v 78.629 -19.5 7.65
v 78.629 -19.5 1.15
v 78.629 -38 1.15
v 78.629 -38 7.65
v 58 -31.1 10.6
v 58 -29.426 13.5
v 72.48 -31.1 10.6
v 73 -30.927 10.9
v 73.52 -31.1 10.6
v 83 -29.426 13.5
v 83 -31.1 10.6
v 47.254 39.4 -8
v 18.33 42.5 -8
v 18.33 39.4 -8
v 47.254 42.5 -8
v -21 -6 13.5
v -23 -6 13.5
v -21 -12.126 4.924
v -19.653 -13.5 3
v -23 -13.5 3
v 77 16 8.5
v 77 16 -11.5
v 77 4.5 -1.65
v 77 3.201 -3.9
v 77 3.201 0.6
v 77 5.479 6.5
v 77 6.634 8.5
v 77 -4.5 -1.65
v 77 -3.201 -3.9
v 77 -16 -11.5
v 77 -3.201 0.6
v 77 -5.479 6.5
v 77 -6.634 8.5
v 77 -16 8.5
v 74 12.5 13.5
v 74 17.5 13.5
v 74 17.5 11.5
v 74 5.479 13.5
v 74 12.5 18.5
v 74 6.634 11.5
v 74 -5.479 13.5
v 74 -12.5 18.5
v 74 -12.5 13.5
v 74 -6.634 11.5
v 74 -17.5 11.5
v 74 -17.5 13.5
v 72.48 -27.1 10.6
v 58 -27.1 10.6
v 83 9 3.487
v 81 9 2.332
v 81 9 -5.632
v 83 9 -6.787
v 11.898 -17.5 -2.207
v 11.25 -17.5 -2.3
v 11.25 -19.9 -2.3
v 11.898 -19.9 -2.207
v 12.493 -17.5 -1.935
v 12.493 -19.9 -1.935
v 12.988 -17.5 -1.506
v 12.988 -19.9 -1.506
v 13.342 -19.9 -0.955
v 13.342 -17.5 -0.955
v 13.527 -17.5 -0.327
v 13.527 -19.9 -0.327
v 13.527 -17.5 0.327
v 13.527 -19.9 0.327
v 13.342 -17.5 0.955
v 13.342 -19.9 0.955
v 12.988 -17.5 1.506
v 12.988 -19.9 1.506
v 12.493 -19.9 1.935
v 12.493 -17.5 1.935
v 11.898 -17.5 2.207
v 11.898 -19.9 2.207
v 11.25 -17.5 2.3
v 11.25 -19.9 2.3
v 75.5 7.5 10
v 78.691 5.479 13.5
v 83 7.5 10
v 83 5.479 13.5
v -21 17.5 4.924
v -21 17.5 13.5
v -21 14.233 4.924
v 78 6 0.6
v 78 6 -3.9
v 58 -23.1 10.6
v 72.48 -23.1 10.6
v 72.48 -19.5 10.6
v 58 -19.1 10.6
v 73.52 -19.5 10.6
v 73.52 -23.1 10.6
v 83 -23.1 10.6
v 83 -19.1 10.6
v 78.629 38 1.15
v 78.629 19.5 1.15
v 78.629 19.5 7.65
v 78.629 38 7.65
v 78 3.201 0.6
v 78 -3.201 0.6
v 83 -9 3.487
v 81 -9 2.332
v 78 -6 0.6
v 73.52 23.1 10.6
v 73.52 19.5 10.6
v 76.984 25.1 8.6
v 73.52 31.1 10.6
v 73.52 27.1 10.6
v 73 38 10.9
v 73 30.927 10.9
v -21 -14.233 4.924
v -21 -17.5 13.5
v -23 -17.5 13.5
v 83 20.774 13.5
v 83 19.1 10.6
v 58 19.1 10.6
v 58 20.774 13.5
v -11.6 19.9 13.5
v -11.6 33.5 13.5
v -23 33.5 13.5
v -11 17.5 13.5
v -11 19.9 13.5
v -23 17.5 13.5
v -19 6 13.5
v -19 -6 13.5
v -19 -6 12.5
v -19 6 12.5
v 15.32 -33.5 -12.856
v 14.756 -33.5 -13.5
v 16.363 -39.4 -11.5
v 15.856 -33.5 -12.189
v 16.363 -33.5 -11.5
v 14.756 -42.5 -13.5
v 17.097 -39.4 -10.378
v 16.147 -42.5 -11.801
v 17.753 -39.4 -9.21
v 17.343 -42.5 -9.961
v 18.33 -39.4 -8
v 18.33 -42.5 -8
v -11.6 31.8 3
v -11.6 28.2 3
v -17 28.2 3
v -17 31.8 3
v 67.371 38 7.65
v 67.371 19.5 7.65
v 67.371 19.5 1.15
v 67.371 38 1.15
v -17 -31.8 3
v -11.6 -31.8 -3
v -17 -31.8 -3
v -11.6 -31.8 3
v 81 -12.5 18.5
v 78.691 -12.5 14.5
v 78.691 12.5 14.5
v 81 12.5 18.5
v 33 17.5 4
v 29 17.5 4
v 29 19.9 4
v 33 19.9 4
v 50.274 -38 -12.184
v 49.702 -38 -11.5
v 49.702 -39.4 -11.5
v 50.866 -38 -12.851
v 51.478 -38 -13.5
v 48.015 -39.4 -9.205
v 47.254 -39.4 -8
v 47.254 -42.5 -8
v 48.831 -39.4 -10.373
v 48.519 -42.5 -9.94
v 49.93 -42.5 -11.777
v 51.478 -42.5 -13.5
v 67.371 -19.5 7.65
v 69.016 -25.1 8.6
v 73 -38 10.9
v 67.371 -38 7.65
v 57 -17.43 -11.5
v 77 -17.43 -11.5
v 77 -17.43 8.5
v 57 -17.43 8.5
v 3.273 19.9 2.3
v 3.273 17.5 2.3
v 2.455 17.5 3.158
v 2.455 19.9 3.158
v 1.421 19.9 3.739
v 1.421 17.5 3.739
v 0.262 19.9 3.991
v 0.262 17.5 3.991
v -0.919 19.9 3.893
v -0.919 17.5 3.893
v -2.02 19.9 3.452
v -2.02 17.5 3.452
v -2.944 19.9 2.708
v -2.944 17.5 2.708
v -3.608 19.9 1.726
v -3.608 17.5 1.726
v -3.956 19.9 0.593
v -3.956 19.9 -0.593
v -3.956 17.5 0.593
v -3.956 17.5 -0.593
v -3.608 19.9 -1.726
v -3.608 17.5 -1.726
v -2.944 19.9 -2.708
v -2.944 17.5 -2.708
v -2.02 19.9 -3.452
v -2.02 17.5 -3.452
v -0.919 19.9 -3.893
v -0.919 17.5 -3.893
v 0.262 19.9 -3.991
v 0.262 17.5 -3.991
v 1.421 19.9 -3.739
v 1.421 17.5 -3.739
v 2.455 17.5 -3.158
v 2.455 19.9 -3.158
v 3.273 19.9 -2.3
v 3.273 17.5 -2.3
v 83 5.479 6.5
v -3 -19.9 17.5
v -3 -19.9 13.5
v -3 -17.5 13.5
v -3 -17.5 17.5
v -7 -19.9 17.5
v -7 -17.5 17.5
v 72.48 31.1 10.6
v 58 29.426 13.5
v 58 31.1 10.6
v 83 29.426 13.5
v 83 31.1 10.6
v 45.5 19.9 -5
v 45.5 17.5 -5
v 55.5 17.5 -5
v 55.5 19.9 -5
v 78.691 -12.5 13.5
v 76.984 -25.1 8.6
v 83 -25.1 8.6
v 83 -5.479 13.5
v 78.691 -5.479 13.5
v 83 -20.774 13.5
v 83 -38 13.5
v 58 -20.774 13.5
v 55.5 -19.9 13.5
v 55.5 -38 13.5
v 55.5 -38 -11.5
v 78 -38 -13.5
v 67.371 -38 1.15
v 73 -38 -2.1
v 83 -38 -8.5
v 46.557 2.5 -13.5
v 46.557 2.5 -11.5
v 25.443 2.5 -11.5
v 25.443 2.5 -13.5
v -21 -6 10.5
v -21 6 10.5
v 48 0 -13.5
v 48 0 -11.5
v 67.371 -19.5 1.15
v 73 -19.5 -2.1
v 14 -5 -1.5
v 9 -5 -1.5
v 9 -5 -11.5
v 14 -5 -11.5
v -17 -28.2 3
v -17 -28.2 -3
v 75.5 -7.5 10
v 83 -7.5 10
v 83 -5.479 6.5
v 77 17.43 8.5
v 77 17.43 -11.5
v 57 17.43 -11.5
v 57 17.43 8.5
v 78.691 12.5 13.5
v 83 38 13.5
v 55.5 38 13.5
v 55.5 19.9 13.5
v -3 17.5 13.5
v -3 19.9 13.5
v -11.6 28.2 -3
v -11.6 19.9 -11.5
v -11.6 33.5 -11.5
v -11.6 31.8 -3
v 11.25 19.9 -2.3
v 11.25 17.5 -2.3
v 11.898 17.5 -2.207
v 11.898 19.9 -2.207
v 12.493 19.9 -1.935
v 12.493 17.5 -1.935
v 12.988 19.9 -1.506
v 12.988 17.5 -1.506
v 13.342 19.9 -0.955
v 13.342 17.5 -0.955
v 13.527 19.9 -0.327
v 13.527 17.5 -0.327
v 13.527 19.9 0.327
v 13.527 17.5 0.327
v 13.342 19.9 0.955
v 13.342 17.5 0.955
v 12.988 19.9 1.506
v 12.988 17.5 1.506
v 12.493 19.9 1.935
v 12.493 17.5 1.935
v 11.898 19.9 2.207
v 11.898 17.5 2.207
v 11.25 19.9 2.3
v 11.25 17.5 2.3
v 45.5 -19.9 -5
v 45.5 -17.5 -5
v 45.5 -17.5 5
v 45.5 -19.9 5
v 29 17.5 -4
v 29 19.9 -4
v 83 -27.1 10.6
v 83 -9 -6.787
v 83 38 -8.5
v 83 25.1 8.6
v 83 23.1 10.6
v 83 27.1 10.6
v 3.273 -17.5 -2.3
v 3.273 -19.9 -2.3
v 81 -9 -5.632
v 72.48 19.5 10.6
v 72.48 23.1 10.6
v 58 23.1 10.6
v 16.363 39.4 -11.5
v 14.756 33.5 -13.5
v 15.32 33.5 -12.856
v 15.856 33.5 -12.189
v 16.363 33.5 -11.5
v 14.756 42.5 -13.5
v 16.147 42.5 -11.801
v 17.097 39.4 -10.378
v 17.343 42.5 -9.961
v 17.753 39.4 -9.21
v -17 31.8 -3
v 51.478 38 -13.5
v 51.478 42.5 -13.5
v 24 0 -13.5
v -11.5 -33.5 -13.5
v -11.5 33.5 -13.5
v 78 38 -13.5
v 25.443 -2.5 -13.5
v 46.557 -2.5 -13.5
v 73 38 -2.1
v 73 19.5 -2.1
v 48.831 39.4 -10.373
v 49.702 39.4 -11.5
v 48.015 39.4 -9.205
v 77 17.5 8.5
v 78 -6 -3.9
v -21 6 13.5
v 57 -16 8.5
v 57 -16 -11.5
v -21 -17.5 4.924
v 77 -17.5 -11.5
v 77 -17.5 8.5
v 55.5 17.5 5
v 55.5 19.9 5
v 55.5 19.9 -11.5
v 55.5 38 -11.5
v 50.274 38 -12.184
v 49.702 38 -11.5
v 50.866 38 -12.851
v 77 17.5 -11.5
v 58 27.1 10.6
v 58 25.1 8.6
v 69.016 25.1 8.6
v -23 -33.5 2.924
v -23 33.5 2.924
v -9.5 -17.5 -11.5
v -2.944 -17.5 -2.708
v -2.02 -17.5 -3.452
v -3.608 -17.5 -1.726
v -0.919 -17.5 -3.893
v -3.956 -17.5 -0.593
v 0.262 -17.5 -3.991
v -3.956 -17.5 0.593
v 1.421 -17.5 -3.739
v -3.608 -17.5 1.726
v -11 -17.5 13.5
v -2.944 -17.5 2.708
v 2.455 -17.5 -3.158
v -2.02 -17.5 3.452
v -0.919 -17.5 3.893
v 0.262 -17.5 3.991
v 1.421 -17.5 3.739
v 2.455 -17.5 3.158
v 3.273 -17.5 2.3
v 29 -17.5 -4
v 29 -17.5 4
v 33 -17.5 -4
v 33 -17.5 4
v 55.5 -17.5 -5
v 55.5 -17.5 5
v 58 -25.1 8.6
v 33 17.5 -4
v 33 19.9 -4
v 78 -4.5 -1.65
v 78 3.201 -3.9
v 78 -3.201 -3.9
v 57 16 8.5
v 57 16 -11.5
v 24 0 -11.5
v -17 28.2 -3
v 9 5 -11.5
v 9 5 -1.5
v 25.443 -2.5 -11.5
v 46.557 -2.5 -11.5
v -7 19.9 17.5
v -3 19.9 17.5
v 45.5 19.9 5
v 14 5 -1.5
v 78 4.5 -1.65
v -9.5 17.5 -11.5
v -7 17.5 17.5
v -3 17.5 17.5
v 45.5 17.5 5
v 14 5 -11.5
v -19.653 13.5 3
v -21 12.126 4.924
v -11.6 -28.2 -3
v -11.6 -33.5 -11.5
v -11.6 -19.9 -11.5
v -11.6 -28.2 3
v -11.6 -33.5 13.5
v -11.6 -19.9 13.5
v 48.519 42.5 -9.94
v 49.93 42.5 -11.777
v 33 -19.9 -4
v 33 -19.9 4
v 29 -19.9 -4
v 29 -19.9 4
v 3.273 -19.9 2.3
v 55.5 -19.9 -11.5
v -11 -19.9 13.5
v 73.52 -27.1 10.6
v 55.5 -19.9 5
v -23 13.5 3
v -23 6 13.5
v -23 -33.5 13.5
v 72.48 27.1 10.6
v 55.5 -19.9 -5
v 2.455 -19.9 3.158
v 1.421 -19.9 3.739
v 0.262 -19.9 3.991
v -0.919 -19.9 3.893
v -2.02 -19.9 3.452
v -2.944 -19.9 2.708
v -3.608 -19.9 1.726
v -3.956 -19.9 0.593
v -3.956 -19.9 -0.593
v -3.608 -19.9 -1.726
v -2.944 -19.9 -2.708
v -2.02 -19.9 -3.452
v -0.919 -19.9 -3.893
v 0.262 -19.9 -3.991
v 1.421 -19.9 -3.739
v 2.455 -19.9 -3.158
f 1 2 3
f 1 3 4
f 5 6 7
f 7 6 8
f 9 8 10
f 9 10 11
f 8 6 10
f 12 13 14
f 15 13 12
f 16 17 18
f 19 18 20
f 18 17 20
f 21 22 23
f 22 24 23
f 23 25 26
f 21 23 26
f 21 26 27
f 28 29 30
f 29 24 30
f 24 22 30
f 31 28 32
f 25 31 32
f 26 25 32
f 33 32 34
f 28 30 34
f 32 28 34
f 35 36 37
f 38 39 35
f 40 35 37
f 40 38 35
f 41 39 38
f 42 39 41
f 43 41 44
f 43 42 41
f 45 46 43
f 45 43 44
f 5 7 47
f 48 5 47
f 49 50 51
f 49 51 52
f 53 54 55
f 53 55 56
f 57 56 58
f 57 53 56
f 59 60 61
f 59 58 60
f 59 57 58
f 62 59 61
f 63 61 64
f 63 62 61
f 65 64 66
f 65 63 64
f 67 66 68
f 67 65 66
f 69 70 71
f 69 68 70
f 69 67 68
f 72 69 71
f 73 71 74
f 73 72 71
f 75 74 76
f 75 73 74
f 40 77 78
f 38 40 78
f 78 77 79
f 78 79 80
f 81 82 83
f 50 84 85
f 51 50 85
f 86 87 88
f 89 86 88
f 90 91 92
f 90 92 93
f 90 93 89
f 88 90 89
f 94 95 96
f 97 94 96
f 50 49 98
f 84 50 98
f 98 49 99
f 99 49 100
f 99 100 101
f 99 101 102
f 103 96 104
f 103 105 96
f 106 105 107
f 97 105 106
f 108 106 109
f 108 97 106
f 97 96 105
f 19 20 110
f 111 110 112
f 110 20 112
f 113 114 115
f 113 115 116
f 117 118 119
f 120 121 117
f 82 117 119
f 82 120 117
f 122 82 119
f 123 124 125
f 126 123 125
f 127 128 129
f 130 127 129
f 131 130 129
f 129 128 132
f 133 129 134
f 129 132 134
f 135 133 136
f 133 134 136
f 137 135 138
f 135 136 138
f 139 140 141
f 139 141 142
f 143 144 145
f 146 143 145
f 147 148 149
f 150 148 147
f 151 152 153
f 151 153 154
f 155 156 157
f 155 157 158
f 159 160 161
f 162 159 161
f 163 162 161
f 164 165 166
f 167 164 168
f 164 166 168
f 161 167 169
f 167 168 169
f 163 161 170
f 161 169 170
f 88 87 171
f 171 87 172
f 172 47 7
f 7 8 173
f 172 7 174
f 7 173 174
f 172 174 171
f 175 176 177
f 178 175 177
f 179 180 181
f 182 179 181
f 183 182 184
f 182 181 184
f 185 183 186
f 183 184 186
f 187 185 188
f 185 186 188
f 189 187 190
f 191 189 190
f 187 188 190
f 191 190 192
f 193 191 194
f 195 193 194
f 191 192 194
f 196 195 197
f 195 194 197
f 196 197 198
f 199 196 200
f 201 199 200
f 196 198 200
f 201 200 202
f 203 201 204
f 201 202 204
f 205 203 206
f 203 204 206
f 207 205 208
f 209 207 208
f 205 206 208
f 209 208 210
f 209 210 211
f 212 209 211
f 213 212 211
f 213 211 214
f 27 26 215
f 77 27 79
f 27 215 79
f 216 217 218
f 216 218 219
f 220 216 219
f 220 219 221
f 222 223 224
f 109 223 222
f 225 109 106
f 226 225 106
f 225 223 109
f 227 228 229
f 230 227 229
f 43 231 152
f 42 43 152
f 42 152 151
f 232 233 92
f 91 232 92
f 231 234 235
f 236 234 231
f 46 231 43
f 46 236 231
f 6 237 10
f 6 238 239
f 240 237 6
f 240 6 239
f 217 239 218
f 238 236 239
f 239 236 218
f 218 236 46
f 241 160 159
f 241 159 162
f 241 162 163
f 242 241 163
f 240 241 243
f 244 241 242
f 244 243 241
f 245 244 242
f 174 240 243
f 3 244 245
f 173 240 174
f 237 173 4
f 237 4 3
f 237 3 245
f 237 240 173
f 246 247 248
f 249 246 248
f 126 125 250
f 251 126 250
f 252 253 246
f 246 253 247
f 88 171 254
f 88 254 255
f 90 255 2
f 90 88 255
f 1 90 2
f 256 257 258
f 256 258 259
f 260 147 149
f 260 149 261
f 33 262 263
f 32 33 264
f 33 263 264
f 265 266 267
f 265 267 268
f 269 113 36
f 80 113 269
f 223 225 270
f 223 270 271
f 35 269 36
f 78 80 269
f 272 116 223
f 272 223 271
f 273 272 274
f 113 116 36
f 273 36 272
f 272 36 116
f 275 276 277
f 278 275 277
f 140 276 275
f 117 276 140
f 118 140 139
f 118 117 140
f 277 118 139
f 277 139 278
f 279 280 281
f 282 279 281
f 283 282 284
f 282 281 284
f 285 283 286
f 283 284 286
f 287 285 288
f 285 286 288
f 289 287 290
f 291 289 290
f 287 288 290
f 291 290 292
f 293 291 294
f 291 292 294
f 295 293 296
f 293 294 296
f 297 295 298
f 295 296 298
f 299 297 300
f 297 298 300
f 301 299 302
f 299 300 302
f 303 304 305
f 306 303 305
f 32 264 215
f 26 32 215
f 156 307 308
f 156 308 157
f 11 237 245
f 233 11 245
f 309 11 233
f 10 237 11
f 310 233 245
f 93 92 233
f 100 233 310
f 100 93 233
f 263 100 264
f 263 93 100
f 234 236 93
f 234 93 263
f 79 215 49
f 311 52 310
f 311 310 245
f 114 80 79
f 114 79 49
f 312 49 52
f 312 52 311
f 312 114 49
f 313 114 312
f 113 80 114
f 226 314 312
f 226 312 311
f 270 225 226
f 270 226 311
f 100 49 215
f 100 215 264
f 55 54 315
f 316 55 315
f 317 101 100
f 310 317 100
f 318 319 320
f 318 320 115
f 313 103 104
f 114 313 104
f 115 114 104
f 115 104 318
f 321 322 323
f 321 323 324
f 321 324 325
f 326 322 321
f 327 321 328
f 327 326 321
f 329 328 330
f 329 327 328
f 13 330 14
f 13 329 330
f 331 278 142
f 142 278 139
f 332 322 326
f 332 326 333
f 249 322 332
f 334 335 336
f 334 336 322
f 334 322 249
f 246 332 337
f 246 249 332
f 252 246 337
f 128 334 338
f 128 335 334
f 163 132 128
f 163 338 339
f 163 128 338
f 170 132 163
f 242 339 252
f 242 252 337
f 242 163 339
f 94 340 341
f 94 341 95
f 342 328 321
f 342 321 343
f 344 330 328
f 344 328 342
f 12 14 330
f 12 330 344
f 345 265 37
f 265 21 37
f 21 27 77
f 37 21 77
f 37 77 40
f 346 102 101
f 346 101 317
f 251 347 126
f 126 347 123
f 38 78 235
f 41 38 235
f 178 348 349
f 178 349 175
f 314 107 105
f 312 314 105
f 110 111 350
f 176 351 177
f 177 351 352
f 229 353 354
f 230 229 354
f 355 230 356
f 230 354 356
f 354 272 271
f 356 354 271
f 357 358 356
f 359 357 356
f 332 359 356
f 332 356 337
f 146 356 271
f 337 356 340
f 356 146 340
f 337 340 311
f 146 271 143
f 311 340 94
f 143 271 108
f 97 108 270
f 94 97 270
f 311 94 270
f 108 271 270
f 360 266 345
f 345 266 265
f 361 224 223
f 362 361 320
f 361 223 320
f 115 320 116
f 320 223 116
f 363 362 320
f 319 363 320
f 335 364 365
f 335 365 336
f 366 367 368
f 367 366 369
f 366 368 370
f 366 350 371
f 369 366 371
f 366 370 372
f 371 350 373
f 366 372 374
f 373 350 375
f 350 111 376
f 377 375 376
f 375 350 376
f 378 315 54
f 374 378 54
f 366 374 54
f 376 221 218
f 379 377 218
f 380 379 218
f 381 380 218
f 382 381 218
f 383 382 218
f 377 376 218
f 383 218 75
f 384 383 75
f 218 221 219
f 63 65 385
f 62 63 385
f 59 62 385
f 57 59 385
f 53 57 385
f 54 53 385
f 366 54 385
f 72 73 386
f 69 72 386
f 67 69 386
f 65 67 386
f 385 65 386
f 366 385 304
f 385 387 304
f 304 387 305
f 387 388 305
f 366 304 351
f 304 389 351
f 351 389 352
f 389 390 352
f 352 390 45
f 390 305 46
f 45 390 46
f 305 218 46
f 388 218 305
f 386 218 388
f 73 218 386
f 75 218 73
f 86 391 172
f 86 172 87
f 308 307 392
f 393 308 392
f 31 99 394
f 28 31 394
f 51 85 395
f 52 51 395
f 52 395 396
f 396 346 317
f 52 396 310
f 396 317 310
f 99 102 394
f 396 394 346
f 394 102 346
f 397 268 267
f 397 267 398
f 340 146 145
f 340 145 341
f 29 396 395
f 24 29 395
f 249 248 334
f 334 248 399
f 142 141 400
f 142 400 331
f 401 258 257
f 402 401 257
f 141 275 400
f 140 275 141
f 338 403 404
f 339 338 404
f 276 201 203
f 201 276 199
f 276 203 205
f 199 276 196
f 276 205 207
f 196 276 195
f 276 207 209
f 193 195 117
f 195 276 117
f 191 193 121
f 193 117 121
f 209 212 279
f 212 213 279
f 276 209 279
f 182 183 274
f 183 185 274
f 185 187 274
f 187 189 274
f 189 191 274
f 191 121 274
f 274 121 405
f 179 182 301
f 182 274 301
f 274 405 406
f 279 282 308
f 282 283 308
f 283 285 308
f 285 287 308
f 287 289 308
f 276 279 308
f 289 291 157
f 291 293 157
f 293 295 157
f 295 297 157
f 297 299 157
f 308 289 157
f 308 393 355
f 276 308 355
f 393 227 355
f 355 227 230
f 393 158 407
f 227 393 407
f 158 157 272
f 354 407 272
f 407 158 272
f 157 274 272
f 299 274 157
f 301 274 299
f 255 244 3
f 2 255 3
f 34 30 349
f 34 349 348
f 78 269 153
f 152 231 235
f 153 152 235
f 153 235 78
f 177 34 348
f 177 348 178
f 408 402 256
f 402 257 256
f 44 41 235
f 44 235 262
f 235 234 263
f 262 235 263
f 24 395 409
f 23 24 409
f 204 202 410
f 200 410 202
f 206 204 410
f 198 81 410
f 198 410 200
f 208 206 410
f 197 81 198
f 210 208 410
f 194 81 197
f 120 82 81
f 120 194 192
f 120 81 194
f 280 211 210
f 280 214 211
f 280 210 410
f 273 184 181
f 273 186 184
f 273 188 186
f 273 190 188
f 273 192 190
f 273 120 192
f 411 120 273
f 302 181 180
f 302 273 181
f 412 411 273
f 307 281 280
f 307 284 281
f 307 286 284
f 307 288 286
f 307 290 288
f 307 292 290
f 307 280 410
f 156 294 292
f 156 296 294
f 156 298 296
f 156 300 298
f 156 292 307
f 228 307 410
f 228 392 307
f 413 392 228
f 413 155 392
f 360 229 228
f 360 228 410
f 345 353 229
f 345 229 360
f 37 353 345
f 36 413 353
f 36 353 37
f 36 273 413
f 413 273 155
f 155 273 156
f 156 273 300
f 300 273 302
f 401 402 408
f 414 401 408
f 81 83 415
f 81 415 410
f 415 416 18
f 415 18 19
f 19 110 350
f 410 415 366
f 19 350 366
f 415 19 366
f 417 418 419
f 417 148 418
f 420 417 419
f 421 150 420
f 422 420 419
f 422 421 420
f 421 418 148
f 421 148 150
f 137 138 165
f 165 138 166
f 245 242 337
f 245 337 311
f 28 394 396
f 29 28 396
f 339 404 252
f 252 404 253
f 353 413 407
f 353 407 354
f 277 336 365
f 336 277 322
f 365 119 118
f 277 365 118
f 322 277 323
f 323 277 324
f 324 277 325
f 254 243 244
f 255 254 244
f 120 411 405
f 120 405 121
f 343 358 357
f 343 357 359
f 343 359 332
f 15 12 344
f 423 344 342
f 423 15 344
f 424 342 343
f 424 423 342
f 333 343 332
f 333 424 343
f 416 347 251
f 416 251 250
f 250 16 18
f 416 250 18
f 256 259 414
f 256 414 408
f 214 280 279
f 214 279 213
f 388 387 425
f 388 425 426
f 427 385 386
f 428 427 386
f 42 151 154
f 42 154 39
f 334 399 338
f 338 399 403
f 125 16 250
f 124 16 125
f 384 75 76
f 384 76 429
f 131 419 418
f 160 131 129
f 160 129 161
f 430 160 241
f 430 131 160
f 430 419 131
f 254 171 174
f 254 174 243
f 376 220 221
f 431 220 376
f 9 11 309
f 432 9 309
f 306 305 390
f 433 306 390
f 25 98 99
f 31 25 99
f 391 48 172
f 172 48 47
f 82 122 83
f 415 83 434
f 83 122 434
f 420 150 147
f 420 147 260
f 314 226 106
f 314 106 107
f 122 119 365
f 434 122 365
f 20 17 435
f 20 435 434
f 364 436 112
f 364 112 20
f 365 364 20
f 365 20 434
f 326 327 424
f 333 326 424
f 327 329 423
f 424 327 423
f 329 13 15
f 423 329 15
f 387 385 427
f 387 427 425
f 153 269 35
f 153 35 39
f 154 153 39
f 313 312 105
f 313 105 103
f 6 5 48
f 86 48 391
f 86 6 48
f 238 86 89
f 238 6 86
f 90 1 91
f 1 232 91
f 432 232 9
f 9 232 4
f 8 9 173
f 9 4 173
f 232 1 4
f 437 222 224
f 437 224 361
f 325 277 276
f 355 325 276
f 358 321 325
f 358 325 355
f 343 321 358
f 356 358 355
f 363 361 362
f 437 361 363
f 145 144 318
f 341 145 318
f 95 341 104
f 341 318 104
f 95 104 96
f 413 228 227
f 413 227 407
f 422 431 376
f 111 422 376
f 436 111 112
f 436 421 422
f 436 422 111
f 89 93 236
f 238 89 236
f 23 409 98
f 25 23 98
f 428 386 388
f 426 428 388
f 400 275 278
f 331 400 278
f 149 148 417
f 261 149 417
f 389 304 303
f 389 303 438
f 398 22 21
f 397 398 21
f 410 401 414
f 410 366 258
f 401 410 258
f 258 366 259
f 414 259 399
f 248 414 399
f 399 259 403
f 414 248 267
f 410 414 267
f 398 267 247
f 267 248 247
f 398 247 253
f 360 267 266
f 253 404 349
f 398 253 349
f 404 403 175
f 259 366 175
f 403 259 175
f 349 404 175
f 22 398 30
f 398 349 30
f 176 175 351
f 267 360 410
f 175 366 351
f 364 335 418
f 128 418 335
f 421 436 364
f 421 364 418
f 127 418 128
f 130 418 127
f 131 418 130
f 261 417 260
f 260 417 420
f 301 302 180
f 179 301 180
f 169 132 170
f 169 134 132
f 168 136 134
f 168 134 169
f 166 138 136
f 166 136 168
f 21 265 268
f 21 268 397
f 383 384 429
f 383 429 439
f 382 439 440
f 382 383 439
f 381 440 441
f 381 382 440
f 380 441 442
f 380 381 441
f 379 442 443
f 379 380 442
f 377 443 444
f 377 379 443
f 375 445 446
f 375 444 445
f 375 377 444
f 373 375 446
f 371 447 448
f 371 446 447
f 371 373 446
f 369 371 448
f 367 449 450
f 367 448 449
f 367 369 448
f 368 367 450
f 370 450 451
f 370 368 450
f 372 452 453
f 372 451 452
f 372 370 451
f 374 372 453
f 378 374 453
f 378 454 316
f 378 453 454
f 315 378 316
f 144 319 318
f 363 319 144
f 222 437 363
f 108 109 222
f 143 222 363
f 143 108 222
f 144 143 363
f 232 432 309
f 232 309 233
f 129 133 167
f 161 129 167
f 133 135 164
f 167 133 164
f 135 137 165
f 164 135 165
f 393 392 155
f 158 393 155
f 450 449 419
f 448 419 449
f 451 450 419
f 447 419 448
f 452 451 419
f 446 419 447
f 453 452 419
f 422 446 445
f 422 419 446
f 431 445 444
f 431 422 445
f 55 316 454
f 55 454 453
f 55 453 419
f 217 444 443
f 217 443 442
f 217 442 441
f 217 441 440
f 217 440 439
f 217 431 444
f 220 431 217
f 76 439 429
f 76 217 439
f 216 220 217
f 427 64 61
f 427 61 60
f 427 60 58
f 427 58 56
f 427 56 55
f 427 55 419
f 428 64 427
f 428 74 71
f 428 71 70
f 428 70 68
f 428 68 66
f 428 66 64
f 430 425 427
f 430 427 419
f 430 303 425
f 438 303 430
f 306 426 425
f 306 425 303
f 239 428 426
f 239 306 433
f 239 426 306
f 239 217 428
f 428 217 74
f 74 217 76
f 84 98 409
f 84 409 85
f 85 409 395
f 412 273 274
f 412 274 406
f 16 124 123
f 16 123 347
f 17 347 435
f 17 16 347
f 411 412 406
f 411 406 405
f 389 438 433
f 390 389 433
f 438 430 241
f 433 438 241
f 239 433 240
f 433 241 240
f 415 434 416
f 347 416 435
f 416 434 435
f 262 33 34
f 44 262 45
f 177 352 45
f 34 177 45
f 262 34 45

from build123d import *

# Parameters (mm, degrees)
SKETCH001_W          = 113
SKETCH001_H          = 85
PAD001_DEPTH         = 25
POCKET_DEPTH         = 36.5
SKETCH003_W          = 67.1
SKETCH003_H          = 19.5
POCKET001_DEPTH      = 61.5
POCKET002_DEPTH      = 17.5
SKETCH005_W          = 4
SKETCH005_H          = 8
SKETCH005_W_2        = 10
SKETCH005_H_2        = 10
POCKET003_DEPTH      = 42.501
POCKET003_DEPTH_BACK = 42.501
SKETCH006_W          = 3.6
SKETCH006_H          = 6
POCKET004_DEPTH      = 17
SKETCH007_W          = 250
SKETCH007_H          = 80
POCKET005_DEPTH      = 112.501
SKETCH008_R          = 30
POCKET006_DEPTH      = 32
POCKET007_DEPTH      = 18.5
POCKET008_DEPTH      = 25
SKETCH012_W          = 37.5
SKETCH012_H          = 25
POCKET009_DEPTH      = 20
SKETCH026_W          = 5
SKETCH026_H          = 10
PAD008_DEPTH         = 5
POCKET014_DEPTH      = 63.501
POCKET015_DEPTH      = 15
SKETCH029_W          = 1.43005
SKETCH029_H          = 20
PAD009_DEPTH         = 20
POCKET016_DEPTH      = 9
CHAMFER_SIZE         = 3
POCKET017_DEPTH      = 15
SKETCH032_W          = 21
SKETCH032_H          = 11.5
POCKET018_DEPTH      = 41


with BuildPart() as part:
    # Sketch001 → Pad001 (new body, symmetric)
    with BuildSketch(Plane.XY):
        with Locations((26.5, 0)):
            Rectangle(SKETCH001_W, SKETCH001_H)
    extrude(amount=PAD001_DEPTH, both=True)

    # Sketch002 (on DatumPlane) → Pocket (cut)
    with BuildSketch(Plane.XZ.offset(70)):
        with BuildLine():
            ThreePointArc((0, -20), (10.954451, -16.733201), (18.330303, -8))
            Line((18.330303, -8), (55.5, -8))
            Line((55.5, -8), (55.5, 20))
            Line((55.5, 20), (-30, 20))
            Line((-30, 20), (-30, -20))
            Line((-30, -20), (0, -20))
        make_face()
    pocket = extrude(amount=-POCKET_DEPTH, mode=Mode.SUBTRACT)

    # Mirrored: Pocket across XZ
    add(pocket.mirror(Plane.XZ), mode=Mode.SUBTRACT)

    # Sketch003 (on DatumPlane) → Pocket001 (cut)
    with BuildSketch(Plane.XY.offset(50)):
        with Locations((21.95, -29.65)):
            Rectangle(SKETCH003_W, SKETCH003_H)
        with Locations((21.95, 29.65)):
            Rectangle(SKETCH003_W, SKETCH003_H)
    extrude(amount=-POCKET001_DEPTH, mode=Mode.SUBTRACT)

    # Sketch004 (on DatumPlane) → Pocket002 (cut, symmetric)
    with BuildSketch(Plane.XZ):
        Polygon((-21, 4.923702), (-9.5, -11.5), (77, -11.5), (77, 8.5), (74, 11.5), (74, 38.5), (-21, 38.5), (-21, 13.5), (-19, 13.5), (-19, 12.5), (-21, 10.5), align=None)
    extrude(amount=POCKET002_DEPTH, both=True, mode=Mode.SUBTRACT)

    # Sketch005 (on DatumPlane) → Pocket003 (cut, two sides)
    with BuildSketch(Plane.XZ) as pocket003_sk:
        with Locations((31, 0)):
            Rectangle(SKETCH005_W, SKETCH005_H)
        with Locations((50.5, 0)):
            Rectangle(SKETCH005_W_2, SKETCH005_H_2)
        with BuildLine():
            ThreePointArc((3.272614, 2.3), (-4, 0), (3.272614, -2.3))
            Line((11.25, -2.3), (3.272614, -2.3))
            ThreePointArc((11.25, -2.3), (13.55, 0), (11.25, 2.3))
            Line((11.25, 2.3), (3.272614, 2.3))
        make_face()
    extrude(amount=-POCKET003_DEPTH, mode=Mode.SUBTRACT)
    extrude(pocket003_sk.sketch, amount=POCKET003_DEPTH_BACK, mode=Mode.SUBTRACT)

    # Sketch006 (on DatumPlane) → Pocket004 (cut)
    with BuildSketch(Plane.YZ):
        with Locations((-30, 0)):
            Rectangle(SKETCH006_W, SKETCH006_H)
        with Locations((30, 0)):
            Rectangle(SKETCH006_W, SKETCH006_H)
    extrude(amount=-POCKET004_DEPTH, mode=Mode.SUBTRACT)

    # Sketch007 (on DatumPlane) → Pocket005 (cut, through all)
    with BuildSketch(Plane.XZ.offset(70)):
        Rectangle(SKETCH007_W, SKETCH007_H)
        Polygon((-11.5, -13.5), (78, -13.5), (83, -8.5), (83, 13.5), (78.690599, 13.5), (78.690599, 14.5), (81, 18.5), (74, 18.5), (74, 13.5), (-3, 13.5), (-3, 17.5), (-7, 17.5), (-11, 13.5), (-23, 13.5), (-23, 2.923702), align=None, mode=Mode.SUBTRACT)
    extrude(amount=-POCKET005_DEPTH, mode=Mode.SUBTRACT)

    # Sketch008 (on DatumPlane) → Pocket006 (cut)
    with BuildSketch(Plane.XZ.offset(70)):
        with Locations((73, 7.4)):
            Circle(SKETCH008_R)
    pocket006 = extrude(amount=-POCKET006_DEPTH, mode=Mode.SUBTRACT)

    # Mirrored001: Pocket006 across XZ
    add(pocket006.mirror(Plane.XZ), mode=Mode.SUBTRACT)

    # Sketch009 (on DatumPlane) → Pocket007 (cut)
    with BuildSketch(Plane.XZ.offset(38)):
        Polygon((73, 10.9), (67.370835, 7.65), (67.370835, 1.15), (73, -2.1), (78.629165, 1.15), (78.629165, 7.65), align=None)
    pocket007 = extrude(amount=-POCKET007_DEPTH, mode=Mode.SUBTRACT)

    # Sketch010 (on DatumPlane) → Pocket008 (cut)
    with BuildSketch(Plane.YZ.offset(83)):
        Polygon((-27.1, 10.6), (-25.1, 8.6), (-23.1, 10.6), (-19.1, 10.6), (-21.986751, 15.6), (-28.213249, 15.6), (-31.1, 10.6), align=None)
    pocket008 = extrude(amount=-POCKET008_DEPTH, mode=Mode.SUBTRACT)

    # Sketch012 (on DatumPlane) → Pocket009 (cut)
    with BuildSketch(Plane.YZ.offset(83)):
        with Locations((-31.25, 26)):
            Rectangle(SKETCH012_W, SKETCH012_H)
        with Locations((31.25, 26)):
            Rectangle(SKETCH012_W, SKETCH012_H)
    extrude(amount=-POCKET009_DEPTH, mode=Mode.SUBTRACT)

    # Mirrored002: Pocket007 across XZ
    add(pocket007.mirror(Plane.XZ), mode=Mode.SUBTRACT)

    # Mirrored003: Pocket008 across XZ
    add(pocket008.mirror(Plane.XZ), mode=Mode.SUBTRACT)

    # Sketch026 (on DatumPlane) → Pad008 (join, symmetric)
    with BuildSketch(Plane.XZ):
        with Locations((11.5, -6.5)):
            Rectangle(SKETCH026_W, SKETCH026_H)
    extrude(amount=PAD008_DEPTH, both=True)

    # Sketch027 (on DatumPlane) → Pocket014 (cut, through all)
    with BuildSketch(Plane.XY.offset(50)):
        Polygon((24, 0), (25.443376, -2.5), (28.330127, -2.5), (43.669873, -2.5), (46.556624, -2.5), (48, 0), (46.556624, 2.5), (43.669873, 2.5), (28.330127, 2.5), (25.443376, 2.5), align=None)
    extrude(amount=-POCKET014_DEPTH, mode=Mode.SUBTRACT)

    # Sketch028 (on DatumPlane) → Pocket015 (cut)
    with BuildSketch(Plane.YZ.offset(83)):
        Polygon((-4.5, -1.65), (-3.200962, -3.9), (-0.602886, -3.9), (0.602886, -3.9), (3.200962, -3.9), (4.5, -1.65), (3.200962, 0.6), (0.602886, 0.6), (-0.602886, 0.6), (-3.200962, 0.6), align=None)
        Polygon((-7.5, 10), (-5.479274, 6.5), (-1.437822, 6.5), (1.437822, 6.5), (5.479274, 6.5), (7.5, 10), (5.479274, 13.5), (1.437822, 13.5), (-1.437822, 13.5), (-5.479274, 13.5), align=None)
    extrude(amount=-POCKET015_DEPTH, mode=Mode.SUBTRACT)

    # Sketch029 (on DatumPlane) → Pad009 (join)
    with BuildSketch(Plane(origin=(77, 0, 0), x_dir=(0, -1, 0), z_dir=(-1, 0, 0))):
        with Locations((-16.715025, -1.5)):
            Rectangle(SKETCH029_W, SKETCH029_H)
        with Locations((16.715025, -1.5)):
            Rectangle(SKETCH029_W, SKETCH029_H)
    extrude(amount=PAD009_DEPTH)

    # Sketch030 (on DatumPlane) → Pocket016 (cut, symmetric)
    with BuildSketch(Plane.XZ):
        Polygon((83, 3.486751), (78, 0.6), (78, -3.9), (83, -6.786751), align=None)
    extrude(amount=POCKET016_DEPTH, both=True, mode=Mode.SUBTRACT)

    # Chamfer
    chamfer_edges = [part.edges().sort_by_distance(p)[0] for p in [
        (78, -9, -1.65),
        (78, 9, -1.65),
    ]]
    chamfer(chamfer_edges, length=CHAMFER_SIZE)

    # Sketch031 (on DatumPlane) → Pocket017 (cut)
    with BuildSketch(Plane(origin=(-30, 0, 0), x_dir=(0, -1, 0), z_dir=(-1, 0, 0))):
        Polygon((-17.5, 13.5), (-13.5, 3), (-6, 13.5), align=None)
        Polygon((6, 13.5), (13.5, 3), (17.5, 13.5), align=None)
    extrude(amount=-POCKET017_DEPTH, mode=Mode.SUBTRACT)

    # Sketch032 (on DatumPlane) → Pocket018 (cut)
    with BuildSketch(Plane.XY.offset(50)):
        with Locations((-10.5, 11.75)):
            Rectangle(SKETCH032_W, SKETCH032_H)
        with Locations((-10.5, -11.75)):
            Rectangle(SKETCH032_W, SKETCH032_H)
    extrude(amount=-POCKET018_DEPTH, mode=Mode.SUBTRACT)


solid = part.part
